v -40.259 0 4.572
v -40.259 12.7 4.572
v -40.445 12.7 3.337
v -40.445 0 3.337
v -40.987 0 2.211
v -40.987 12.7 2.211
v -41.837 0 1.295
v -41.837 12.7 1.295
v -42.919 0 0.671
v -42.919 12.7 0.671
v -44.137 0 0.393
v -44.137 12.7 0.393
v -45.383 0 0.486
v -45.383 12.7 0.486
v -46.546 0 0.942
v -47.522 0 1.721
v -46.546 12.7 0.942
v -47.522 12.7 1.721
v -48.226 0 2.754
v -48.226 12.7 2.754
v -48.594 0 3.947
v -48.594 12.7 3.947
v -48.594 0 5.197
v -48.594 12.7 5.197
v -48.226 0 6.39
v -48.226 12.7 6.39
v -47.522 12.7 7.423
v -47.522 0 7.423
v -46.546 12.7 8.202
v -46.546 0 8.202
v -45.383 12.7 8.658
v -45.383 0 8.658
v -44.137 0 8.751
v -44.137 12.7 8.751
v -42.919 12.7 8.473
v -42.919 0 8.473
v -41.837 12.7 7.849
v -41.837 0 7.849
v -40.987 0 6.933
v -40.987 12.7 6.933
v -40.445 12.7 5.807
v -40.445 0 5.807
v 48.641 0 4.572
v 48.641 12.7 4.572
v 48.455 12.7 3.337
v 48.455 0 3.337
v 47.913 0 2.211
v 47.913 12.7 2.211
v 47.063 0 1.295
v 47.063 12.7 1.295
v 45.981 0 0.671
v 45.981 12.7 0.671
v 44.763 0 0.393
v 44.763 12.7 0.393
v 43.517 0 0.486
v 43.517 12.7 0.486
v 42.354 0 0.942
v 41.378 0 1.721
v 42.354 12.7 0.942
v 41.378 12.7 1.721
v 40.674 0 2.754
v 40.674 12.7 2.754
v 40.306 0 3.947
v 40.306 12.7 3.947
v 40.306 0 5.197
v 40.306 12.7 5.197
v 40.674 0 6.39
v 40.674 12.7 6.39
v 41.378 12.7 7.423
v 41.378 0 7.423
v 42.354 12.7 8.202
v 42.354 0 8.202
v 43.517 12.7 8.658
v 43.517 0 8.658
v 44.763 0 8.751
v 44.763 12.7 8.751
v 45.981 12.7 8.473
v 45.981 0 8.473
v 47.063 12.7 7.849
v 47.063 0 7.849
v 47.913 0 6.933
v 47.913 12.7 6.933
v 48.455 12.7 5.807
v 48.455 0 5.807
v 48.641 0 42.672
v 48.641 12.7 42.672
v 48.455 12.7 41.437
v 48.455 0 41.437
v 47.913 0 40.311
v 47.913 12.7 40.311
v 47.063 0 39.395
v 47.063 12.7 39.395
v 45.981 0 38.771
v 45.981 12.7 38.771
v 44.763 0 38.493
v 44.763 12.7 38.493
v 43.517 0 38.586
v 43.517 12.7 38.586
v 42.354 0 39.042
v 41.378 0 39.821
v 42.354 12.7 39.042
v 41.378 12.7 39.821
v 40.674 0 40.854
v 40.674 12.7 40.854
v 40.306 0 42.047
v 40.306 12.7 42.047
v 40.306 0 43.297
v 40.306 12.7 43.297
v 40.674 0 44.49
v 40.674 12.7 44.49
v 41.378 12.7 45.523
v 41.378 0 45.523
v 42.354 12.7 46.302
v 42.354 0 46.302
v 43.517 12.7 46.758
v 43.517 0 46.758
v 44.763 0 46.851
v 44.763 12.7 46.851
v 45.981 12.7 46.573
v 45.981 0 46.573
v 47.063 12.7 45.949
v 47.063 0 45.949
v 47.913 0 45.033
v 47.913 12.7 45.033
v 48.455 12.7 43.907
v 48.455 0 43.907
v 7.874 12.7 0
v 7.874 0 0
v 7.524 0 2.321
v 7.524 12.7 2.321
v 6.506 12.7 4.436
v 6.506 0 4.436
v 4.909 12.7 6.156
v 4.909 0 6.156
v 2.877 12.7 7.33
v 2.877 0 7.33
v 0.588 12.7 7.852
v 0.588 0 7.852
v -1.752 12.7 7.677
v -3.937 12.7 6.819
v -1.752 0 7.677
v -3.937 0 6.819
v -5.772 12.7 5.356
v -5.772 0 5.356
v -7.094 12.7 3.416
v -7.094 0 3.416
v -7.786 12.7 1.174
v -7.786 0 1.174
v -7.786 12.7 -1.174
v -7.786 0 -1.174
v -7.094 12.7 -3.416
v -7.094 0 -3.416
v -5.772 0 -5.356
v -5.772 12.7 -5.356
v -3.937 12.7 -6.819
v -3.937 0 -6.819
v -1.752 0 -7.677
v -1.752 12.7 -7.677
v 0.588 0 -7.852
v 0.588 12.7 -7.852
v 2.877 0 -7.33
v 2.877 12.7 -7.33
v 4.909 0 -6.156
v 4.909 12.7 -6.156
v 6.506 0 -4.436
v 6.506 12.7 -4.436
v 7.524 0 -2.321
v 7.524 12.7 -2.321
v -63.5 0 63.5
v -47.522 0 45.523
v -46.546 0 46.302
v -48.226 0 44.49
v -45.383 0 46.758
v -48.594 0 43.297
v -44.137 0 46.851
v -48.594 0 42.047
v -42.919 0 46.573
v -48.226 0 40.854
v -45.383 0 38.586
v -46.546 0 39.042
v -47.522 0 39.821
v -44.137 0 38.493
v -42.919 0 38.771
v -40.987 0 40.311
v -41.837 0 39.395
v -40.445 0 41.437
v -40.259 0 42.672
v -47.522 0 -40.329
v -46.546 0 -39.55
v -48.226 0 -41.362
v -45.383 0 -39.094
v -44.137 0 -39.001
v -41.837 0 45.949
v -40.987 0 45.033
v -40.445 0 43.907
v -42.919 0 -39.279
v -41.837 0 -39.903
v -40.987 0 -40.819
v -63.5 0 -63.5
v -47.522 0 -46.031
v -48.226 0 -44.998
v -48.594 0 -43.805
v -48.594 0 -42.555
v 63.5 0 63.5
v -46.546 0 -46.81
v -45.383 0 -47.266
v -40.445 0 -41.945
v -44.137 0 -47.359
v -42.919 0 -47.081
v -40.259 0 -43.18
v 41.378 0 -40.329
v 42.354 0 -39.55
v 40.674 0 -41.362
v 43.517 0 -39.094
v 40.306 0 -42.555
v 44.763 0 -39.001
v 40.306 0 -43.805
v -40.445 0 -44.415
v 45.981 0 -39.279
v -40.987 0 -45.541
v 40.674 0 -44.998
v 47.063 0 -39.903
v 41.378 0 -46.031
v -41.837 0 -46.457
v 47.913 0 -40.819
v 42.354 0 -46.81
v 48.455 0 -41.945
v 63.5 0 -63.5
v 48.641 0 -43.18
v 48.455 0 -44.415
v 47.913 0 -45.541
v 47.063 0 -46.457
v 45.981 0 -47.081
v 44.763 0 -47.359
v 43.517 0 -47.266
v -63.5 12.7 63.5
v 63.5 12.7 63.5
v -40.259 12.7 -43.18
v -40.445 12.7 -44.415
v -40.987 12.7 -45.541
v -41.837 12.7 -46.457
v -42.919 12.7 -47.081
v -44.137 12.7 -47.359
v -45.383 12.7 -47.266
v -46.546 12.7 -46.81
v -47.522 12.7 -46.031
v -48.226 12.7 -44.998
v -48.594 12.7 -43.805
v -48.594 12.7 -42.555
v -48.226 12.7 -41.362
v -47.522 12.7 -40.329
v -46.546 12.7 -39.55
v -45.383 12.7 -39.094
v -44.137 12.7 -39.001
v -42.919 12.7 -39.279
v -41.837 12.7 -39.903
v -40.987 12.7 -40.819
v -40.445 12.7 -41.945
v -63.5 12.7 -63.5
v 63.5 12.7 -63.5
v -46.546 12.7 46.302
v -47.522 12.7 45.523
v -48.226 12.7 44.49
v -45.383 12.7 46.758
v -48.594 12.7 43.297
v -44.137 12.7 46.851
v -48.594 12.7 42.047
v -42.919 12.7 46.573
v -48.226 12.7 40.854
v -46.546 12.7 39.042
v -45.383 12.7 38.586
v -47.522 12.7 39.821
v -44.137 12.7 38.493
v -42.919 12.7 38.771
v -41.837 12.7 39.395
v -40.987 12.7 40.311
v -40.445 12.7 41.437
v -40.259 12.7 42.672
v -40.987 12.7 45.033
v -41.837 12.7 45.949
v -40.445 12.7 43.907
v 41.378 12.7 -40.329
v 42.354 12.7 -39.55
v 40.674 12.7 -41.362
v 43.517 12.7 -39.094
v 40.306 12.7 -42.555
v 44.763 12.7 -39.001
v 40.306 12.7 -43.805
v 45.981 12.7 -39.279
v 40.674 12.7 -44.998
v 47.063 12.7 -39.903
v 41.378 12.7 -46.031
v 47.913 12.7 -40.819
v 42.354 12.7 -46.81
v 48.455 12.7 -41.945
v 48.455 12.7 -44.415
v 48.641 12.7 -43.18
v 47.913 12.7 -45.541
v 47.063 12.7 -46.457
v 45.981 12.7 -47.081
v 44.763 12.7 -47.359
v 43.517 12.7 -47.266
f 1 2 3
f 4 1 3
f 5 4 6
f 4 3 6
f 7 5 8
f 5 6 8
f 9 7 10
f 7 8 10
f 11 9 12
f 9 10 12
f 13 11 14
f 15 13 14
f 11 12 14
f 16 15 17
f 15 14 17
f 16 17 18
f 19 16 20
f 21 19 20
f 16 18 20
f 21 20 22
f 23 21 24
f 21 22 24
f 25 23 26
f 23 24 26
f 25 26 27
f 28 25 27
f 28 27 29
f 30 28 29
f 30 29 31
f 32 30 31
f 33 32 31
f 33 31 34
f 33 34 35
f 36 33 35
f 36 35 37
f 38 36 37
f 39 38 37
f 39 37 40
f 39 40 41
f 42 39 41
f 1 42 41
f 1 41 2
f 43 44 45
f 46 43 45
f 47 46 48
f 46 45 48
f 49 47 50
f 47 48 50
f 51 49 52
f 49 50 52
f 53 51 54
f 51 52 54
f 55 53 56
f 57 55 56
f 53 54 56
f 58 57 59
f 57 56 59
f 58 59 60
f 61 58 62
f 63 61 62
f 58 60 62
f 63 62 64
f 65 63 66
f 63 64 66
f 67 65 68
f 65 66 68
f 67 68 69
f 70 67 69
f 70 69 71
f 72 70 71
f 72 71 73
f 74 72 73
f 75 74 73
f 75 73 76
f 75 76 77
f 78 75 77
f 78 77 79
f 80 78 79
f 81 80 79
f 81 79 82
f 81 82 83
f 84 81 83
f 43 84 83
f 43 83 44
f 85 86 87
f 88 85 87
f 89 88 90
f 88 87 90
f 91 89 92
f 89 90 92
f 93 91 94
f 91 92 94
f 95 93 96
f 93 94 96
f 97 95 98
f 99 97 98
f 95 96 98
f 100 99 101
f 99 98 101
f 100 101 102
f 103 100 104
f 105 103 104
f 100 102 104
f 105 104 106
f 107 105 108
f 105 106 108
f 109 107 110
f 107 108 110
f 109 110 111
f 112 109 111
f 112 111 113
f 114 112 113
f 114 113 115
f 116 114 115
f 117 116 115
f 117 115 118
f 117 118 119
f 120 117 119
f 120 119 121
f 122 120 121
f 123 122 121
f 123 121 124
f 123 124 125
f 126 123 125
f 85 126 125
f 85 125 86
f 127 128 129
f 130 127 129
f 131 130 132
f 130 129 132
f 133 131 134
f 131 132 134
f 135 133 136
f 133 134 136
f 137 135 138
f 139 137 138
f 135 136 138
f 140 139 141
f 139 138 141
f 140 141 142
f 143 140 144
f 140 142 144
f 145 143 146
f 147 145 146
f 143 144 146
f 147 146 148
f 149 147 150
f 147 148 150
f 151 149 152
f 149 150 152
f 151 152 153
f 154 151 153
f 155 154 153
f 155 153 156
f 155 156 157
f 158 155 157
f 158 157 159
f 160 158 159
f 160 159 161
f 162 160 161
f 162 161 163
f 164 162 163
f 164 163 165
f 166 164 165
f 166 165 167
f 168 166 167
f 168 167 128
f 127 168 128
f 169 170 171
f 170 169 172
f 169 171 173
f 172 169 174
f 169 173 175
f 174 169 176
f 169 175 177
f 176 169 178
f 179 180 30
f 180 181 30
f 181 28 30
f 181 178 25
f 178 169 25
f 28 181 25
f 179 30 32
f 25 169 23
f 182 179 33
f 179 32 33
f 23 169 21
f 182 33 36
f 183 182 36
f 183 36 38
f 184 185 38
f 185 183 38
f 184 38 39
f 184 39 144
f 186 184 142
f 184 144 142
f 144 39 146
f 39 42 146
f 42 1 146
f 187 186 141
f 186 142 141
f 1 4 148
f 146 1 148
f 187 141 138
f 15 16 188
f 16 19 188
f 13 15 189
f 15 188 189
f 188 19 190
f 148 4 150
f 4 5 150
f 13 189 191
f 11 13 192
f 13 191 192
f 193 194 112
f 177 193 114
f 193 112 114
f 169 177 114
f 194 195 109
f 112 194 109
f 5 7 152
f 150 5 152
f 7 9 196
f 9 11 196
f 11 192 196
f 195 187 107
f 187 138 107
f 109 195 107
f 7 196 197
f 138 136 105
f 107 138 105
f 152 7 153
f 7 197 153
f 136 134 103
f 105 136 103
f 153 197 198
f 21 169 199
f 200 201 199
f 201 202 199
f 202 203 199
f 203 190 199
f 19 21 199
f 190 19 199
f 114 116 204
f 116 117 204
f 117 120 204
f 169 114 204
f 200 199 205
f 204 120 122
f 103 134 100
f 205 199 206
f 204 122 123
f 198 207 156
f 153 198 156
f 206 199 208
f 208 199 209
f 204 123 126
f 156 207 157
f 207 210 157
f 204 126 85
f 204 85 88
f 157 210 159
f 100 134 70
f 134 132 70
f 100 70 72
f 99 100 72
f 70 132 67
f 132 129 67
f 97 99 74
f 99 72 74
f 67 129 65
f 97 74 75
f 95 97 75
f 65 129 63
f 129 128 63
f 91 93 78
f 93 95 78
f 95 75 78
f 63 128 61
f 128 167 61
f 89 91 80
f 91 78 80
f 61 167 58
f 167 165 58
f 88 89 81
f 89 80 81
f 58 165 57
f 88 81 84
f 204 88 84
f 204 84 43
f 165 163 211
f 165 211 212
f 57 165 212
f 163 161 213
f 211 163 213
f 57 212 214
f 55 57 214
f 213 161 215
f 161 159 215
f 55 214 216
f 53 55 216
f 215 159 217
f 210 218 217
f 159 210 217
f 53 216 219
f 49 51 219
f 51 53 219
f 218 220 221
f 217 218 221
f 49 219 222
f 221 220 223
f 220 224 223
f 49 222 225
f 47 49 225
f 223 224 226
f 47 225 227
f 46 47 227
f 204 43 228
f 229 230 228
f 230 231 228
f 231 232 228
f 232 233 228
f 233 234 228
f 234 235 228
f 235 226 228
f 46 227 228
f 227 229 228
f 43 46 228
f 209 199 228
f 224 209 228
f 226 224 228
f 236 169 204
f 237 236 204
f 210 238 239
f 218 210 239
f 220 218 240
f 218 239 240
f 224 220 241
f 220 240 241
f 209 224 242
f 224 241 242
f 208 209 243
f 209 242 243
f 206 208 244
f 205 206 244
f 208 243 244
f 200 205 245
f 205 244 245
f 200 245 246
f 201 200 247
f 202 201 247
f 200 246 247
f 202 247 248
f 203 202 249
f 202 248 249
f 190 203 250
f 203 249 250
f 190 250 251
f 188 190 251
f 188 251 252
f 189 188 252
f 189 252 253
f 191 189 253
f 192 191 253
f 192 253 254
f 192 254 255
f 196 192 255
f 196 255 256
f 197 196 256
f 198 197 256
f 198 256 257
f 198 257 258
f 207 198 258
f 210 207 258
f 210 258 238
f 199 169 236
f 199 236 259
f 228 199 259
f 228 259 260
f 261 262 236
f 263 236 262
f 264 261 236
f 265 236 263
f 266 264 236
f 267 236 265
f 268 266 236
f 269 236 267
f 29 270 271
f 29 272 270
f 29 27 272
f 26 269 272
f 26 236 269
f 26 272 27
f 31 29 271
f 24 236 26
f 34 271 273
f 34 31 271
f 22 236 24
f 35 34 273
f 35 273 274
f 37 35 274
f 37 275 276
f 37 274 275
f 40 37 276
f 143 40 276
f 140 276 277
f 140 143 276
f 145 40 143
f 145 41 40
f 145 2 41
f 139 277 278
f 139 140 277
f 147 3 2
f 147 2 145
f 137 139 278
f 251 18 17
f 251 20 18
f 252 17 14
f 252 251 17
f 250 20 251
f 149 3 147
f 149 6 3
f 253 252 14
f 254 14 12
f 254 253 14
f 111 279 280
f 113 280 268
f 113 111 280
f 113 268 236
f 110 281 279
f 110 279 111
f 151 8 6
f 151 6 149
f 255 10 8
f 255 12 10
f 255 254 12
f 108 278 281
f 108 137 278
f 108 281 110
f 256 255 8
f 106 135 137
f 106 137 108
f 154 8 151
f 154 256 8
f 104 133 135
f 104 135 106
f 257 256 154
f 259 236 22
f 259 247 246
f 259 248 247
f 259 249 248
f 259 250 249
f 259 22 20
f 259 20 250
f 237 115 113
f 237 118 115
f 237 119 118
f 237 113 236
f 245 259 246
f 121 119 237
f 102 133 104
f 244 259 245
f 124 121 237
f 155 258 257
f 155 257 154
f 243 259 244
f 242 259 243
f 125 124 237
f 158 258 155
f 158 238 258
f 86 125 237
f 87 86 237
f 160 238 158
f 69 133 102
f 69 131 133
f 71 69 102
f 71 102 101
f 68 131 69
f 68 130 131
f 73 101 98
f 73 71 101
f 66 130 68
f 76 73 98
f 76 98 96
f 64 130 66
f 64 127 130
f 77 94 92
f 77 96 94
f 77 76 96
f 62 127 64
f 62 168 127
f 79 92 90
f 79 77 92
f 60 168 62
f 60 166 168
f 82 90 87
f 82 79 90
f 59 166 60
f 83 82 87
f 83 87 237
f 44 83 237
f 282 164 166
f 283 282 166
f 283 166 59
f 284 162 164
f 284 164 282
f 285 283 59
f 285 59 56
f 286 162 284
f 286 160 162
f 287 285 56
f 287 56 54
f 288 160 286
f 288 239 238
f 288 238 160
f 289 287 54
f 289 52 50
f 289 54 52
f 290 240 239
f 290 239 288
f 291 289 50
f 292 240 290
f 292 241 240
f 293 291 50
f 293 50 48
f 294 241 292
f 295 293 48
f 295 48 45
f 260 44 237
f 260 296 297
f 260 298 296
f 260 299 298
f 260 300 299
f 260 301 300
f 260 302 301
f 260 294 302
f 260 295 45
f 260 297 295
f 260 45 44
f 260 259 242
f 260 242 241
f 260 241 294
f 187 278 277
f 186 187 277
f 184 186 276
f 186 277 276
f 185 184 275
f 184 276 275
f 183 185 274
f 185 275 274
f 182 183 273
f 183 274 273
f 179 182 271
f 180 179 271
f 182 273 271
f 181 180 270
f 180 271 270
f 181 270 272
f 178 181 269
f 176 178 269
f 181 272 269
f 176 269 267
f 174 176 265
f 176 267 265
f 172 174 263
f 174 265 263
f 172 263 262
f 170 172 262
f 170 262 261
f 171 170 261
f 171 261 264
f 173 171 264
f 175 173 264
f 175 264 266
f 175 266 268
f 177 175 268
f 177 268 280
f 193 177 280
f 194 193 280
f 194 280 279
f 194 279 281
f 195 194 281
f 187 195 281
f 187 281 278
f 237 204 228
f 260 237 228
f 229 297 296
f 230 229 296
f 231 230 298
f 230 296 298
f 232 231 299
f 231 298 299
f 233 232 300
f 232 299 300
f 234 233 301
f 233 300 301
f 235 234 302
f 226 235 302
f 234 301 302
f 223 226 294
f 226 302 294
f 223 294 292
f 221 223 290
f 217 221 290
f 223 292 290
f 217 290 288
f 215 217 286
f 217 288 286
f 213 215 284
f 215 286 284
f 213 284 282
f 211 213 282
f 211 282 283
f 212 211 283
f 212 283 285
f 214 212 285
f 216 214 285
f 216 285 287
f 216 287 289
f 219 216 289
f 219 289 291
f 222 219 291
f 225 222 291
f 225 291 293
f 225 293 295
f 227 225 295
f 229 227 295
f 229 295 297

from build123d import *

# Parameters (mm, degrees)
SKETCH2_W              = 127
SKETCH2_H              = 127
BOSS_EXTRUDE1_DEPTH    = 12.7
F_10_0MM_DOWEL_HOLE1_D = 8.382
SKETCH12_R             = 7.874
CUT_EXTRUDE2_DEPTH     = 13.7


with BuildPart() as part:
    # Sketch2 → Boss-Extrude1 (new body)
    with BuildSketch(Plane(origin=(0, 0, 0), x_dir=(1, 0, 0), z_dir=(0, 1, 0))):
        Rectangle(SKETCH2_W, SKETCH2_H)
    extrude(amount=BOSS_EXTRUDE1_DEPTH)

    # Ø10.0mm Dowel Hole1 (through all)
    with Locations(Plane(origin=(0, 0, 0), x_dir=(-1, 0, 0), z_dir=(0, -1, 0))):
        with Locations((-44.45, 43.18), (-44.45, -4.572), (-44.45, -42.672), (44.45, 43.18), (44.45, -4.572), (44.45, -42.672)):
            Hole(F_10_0MM_DOWEL_HOLE1_D / 2)

    # Sketch12 → Cut-Extrude2 (cut, through all)
    with BuildSketch(Plane.XZ):
        Circle(SKETCH12_R)
    extrude(amount=-CUT_EXTRUDE2_DEPTH, mode=Mode.SUBTRACT)


solid = part.part
